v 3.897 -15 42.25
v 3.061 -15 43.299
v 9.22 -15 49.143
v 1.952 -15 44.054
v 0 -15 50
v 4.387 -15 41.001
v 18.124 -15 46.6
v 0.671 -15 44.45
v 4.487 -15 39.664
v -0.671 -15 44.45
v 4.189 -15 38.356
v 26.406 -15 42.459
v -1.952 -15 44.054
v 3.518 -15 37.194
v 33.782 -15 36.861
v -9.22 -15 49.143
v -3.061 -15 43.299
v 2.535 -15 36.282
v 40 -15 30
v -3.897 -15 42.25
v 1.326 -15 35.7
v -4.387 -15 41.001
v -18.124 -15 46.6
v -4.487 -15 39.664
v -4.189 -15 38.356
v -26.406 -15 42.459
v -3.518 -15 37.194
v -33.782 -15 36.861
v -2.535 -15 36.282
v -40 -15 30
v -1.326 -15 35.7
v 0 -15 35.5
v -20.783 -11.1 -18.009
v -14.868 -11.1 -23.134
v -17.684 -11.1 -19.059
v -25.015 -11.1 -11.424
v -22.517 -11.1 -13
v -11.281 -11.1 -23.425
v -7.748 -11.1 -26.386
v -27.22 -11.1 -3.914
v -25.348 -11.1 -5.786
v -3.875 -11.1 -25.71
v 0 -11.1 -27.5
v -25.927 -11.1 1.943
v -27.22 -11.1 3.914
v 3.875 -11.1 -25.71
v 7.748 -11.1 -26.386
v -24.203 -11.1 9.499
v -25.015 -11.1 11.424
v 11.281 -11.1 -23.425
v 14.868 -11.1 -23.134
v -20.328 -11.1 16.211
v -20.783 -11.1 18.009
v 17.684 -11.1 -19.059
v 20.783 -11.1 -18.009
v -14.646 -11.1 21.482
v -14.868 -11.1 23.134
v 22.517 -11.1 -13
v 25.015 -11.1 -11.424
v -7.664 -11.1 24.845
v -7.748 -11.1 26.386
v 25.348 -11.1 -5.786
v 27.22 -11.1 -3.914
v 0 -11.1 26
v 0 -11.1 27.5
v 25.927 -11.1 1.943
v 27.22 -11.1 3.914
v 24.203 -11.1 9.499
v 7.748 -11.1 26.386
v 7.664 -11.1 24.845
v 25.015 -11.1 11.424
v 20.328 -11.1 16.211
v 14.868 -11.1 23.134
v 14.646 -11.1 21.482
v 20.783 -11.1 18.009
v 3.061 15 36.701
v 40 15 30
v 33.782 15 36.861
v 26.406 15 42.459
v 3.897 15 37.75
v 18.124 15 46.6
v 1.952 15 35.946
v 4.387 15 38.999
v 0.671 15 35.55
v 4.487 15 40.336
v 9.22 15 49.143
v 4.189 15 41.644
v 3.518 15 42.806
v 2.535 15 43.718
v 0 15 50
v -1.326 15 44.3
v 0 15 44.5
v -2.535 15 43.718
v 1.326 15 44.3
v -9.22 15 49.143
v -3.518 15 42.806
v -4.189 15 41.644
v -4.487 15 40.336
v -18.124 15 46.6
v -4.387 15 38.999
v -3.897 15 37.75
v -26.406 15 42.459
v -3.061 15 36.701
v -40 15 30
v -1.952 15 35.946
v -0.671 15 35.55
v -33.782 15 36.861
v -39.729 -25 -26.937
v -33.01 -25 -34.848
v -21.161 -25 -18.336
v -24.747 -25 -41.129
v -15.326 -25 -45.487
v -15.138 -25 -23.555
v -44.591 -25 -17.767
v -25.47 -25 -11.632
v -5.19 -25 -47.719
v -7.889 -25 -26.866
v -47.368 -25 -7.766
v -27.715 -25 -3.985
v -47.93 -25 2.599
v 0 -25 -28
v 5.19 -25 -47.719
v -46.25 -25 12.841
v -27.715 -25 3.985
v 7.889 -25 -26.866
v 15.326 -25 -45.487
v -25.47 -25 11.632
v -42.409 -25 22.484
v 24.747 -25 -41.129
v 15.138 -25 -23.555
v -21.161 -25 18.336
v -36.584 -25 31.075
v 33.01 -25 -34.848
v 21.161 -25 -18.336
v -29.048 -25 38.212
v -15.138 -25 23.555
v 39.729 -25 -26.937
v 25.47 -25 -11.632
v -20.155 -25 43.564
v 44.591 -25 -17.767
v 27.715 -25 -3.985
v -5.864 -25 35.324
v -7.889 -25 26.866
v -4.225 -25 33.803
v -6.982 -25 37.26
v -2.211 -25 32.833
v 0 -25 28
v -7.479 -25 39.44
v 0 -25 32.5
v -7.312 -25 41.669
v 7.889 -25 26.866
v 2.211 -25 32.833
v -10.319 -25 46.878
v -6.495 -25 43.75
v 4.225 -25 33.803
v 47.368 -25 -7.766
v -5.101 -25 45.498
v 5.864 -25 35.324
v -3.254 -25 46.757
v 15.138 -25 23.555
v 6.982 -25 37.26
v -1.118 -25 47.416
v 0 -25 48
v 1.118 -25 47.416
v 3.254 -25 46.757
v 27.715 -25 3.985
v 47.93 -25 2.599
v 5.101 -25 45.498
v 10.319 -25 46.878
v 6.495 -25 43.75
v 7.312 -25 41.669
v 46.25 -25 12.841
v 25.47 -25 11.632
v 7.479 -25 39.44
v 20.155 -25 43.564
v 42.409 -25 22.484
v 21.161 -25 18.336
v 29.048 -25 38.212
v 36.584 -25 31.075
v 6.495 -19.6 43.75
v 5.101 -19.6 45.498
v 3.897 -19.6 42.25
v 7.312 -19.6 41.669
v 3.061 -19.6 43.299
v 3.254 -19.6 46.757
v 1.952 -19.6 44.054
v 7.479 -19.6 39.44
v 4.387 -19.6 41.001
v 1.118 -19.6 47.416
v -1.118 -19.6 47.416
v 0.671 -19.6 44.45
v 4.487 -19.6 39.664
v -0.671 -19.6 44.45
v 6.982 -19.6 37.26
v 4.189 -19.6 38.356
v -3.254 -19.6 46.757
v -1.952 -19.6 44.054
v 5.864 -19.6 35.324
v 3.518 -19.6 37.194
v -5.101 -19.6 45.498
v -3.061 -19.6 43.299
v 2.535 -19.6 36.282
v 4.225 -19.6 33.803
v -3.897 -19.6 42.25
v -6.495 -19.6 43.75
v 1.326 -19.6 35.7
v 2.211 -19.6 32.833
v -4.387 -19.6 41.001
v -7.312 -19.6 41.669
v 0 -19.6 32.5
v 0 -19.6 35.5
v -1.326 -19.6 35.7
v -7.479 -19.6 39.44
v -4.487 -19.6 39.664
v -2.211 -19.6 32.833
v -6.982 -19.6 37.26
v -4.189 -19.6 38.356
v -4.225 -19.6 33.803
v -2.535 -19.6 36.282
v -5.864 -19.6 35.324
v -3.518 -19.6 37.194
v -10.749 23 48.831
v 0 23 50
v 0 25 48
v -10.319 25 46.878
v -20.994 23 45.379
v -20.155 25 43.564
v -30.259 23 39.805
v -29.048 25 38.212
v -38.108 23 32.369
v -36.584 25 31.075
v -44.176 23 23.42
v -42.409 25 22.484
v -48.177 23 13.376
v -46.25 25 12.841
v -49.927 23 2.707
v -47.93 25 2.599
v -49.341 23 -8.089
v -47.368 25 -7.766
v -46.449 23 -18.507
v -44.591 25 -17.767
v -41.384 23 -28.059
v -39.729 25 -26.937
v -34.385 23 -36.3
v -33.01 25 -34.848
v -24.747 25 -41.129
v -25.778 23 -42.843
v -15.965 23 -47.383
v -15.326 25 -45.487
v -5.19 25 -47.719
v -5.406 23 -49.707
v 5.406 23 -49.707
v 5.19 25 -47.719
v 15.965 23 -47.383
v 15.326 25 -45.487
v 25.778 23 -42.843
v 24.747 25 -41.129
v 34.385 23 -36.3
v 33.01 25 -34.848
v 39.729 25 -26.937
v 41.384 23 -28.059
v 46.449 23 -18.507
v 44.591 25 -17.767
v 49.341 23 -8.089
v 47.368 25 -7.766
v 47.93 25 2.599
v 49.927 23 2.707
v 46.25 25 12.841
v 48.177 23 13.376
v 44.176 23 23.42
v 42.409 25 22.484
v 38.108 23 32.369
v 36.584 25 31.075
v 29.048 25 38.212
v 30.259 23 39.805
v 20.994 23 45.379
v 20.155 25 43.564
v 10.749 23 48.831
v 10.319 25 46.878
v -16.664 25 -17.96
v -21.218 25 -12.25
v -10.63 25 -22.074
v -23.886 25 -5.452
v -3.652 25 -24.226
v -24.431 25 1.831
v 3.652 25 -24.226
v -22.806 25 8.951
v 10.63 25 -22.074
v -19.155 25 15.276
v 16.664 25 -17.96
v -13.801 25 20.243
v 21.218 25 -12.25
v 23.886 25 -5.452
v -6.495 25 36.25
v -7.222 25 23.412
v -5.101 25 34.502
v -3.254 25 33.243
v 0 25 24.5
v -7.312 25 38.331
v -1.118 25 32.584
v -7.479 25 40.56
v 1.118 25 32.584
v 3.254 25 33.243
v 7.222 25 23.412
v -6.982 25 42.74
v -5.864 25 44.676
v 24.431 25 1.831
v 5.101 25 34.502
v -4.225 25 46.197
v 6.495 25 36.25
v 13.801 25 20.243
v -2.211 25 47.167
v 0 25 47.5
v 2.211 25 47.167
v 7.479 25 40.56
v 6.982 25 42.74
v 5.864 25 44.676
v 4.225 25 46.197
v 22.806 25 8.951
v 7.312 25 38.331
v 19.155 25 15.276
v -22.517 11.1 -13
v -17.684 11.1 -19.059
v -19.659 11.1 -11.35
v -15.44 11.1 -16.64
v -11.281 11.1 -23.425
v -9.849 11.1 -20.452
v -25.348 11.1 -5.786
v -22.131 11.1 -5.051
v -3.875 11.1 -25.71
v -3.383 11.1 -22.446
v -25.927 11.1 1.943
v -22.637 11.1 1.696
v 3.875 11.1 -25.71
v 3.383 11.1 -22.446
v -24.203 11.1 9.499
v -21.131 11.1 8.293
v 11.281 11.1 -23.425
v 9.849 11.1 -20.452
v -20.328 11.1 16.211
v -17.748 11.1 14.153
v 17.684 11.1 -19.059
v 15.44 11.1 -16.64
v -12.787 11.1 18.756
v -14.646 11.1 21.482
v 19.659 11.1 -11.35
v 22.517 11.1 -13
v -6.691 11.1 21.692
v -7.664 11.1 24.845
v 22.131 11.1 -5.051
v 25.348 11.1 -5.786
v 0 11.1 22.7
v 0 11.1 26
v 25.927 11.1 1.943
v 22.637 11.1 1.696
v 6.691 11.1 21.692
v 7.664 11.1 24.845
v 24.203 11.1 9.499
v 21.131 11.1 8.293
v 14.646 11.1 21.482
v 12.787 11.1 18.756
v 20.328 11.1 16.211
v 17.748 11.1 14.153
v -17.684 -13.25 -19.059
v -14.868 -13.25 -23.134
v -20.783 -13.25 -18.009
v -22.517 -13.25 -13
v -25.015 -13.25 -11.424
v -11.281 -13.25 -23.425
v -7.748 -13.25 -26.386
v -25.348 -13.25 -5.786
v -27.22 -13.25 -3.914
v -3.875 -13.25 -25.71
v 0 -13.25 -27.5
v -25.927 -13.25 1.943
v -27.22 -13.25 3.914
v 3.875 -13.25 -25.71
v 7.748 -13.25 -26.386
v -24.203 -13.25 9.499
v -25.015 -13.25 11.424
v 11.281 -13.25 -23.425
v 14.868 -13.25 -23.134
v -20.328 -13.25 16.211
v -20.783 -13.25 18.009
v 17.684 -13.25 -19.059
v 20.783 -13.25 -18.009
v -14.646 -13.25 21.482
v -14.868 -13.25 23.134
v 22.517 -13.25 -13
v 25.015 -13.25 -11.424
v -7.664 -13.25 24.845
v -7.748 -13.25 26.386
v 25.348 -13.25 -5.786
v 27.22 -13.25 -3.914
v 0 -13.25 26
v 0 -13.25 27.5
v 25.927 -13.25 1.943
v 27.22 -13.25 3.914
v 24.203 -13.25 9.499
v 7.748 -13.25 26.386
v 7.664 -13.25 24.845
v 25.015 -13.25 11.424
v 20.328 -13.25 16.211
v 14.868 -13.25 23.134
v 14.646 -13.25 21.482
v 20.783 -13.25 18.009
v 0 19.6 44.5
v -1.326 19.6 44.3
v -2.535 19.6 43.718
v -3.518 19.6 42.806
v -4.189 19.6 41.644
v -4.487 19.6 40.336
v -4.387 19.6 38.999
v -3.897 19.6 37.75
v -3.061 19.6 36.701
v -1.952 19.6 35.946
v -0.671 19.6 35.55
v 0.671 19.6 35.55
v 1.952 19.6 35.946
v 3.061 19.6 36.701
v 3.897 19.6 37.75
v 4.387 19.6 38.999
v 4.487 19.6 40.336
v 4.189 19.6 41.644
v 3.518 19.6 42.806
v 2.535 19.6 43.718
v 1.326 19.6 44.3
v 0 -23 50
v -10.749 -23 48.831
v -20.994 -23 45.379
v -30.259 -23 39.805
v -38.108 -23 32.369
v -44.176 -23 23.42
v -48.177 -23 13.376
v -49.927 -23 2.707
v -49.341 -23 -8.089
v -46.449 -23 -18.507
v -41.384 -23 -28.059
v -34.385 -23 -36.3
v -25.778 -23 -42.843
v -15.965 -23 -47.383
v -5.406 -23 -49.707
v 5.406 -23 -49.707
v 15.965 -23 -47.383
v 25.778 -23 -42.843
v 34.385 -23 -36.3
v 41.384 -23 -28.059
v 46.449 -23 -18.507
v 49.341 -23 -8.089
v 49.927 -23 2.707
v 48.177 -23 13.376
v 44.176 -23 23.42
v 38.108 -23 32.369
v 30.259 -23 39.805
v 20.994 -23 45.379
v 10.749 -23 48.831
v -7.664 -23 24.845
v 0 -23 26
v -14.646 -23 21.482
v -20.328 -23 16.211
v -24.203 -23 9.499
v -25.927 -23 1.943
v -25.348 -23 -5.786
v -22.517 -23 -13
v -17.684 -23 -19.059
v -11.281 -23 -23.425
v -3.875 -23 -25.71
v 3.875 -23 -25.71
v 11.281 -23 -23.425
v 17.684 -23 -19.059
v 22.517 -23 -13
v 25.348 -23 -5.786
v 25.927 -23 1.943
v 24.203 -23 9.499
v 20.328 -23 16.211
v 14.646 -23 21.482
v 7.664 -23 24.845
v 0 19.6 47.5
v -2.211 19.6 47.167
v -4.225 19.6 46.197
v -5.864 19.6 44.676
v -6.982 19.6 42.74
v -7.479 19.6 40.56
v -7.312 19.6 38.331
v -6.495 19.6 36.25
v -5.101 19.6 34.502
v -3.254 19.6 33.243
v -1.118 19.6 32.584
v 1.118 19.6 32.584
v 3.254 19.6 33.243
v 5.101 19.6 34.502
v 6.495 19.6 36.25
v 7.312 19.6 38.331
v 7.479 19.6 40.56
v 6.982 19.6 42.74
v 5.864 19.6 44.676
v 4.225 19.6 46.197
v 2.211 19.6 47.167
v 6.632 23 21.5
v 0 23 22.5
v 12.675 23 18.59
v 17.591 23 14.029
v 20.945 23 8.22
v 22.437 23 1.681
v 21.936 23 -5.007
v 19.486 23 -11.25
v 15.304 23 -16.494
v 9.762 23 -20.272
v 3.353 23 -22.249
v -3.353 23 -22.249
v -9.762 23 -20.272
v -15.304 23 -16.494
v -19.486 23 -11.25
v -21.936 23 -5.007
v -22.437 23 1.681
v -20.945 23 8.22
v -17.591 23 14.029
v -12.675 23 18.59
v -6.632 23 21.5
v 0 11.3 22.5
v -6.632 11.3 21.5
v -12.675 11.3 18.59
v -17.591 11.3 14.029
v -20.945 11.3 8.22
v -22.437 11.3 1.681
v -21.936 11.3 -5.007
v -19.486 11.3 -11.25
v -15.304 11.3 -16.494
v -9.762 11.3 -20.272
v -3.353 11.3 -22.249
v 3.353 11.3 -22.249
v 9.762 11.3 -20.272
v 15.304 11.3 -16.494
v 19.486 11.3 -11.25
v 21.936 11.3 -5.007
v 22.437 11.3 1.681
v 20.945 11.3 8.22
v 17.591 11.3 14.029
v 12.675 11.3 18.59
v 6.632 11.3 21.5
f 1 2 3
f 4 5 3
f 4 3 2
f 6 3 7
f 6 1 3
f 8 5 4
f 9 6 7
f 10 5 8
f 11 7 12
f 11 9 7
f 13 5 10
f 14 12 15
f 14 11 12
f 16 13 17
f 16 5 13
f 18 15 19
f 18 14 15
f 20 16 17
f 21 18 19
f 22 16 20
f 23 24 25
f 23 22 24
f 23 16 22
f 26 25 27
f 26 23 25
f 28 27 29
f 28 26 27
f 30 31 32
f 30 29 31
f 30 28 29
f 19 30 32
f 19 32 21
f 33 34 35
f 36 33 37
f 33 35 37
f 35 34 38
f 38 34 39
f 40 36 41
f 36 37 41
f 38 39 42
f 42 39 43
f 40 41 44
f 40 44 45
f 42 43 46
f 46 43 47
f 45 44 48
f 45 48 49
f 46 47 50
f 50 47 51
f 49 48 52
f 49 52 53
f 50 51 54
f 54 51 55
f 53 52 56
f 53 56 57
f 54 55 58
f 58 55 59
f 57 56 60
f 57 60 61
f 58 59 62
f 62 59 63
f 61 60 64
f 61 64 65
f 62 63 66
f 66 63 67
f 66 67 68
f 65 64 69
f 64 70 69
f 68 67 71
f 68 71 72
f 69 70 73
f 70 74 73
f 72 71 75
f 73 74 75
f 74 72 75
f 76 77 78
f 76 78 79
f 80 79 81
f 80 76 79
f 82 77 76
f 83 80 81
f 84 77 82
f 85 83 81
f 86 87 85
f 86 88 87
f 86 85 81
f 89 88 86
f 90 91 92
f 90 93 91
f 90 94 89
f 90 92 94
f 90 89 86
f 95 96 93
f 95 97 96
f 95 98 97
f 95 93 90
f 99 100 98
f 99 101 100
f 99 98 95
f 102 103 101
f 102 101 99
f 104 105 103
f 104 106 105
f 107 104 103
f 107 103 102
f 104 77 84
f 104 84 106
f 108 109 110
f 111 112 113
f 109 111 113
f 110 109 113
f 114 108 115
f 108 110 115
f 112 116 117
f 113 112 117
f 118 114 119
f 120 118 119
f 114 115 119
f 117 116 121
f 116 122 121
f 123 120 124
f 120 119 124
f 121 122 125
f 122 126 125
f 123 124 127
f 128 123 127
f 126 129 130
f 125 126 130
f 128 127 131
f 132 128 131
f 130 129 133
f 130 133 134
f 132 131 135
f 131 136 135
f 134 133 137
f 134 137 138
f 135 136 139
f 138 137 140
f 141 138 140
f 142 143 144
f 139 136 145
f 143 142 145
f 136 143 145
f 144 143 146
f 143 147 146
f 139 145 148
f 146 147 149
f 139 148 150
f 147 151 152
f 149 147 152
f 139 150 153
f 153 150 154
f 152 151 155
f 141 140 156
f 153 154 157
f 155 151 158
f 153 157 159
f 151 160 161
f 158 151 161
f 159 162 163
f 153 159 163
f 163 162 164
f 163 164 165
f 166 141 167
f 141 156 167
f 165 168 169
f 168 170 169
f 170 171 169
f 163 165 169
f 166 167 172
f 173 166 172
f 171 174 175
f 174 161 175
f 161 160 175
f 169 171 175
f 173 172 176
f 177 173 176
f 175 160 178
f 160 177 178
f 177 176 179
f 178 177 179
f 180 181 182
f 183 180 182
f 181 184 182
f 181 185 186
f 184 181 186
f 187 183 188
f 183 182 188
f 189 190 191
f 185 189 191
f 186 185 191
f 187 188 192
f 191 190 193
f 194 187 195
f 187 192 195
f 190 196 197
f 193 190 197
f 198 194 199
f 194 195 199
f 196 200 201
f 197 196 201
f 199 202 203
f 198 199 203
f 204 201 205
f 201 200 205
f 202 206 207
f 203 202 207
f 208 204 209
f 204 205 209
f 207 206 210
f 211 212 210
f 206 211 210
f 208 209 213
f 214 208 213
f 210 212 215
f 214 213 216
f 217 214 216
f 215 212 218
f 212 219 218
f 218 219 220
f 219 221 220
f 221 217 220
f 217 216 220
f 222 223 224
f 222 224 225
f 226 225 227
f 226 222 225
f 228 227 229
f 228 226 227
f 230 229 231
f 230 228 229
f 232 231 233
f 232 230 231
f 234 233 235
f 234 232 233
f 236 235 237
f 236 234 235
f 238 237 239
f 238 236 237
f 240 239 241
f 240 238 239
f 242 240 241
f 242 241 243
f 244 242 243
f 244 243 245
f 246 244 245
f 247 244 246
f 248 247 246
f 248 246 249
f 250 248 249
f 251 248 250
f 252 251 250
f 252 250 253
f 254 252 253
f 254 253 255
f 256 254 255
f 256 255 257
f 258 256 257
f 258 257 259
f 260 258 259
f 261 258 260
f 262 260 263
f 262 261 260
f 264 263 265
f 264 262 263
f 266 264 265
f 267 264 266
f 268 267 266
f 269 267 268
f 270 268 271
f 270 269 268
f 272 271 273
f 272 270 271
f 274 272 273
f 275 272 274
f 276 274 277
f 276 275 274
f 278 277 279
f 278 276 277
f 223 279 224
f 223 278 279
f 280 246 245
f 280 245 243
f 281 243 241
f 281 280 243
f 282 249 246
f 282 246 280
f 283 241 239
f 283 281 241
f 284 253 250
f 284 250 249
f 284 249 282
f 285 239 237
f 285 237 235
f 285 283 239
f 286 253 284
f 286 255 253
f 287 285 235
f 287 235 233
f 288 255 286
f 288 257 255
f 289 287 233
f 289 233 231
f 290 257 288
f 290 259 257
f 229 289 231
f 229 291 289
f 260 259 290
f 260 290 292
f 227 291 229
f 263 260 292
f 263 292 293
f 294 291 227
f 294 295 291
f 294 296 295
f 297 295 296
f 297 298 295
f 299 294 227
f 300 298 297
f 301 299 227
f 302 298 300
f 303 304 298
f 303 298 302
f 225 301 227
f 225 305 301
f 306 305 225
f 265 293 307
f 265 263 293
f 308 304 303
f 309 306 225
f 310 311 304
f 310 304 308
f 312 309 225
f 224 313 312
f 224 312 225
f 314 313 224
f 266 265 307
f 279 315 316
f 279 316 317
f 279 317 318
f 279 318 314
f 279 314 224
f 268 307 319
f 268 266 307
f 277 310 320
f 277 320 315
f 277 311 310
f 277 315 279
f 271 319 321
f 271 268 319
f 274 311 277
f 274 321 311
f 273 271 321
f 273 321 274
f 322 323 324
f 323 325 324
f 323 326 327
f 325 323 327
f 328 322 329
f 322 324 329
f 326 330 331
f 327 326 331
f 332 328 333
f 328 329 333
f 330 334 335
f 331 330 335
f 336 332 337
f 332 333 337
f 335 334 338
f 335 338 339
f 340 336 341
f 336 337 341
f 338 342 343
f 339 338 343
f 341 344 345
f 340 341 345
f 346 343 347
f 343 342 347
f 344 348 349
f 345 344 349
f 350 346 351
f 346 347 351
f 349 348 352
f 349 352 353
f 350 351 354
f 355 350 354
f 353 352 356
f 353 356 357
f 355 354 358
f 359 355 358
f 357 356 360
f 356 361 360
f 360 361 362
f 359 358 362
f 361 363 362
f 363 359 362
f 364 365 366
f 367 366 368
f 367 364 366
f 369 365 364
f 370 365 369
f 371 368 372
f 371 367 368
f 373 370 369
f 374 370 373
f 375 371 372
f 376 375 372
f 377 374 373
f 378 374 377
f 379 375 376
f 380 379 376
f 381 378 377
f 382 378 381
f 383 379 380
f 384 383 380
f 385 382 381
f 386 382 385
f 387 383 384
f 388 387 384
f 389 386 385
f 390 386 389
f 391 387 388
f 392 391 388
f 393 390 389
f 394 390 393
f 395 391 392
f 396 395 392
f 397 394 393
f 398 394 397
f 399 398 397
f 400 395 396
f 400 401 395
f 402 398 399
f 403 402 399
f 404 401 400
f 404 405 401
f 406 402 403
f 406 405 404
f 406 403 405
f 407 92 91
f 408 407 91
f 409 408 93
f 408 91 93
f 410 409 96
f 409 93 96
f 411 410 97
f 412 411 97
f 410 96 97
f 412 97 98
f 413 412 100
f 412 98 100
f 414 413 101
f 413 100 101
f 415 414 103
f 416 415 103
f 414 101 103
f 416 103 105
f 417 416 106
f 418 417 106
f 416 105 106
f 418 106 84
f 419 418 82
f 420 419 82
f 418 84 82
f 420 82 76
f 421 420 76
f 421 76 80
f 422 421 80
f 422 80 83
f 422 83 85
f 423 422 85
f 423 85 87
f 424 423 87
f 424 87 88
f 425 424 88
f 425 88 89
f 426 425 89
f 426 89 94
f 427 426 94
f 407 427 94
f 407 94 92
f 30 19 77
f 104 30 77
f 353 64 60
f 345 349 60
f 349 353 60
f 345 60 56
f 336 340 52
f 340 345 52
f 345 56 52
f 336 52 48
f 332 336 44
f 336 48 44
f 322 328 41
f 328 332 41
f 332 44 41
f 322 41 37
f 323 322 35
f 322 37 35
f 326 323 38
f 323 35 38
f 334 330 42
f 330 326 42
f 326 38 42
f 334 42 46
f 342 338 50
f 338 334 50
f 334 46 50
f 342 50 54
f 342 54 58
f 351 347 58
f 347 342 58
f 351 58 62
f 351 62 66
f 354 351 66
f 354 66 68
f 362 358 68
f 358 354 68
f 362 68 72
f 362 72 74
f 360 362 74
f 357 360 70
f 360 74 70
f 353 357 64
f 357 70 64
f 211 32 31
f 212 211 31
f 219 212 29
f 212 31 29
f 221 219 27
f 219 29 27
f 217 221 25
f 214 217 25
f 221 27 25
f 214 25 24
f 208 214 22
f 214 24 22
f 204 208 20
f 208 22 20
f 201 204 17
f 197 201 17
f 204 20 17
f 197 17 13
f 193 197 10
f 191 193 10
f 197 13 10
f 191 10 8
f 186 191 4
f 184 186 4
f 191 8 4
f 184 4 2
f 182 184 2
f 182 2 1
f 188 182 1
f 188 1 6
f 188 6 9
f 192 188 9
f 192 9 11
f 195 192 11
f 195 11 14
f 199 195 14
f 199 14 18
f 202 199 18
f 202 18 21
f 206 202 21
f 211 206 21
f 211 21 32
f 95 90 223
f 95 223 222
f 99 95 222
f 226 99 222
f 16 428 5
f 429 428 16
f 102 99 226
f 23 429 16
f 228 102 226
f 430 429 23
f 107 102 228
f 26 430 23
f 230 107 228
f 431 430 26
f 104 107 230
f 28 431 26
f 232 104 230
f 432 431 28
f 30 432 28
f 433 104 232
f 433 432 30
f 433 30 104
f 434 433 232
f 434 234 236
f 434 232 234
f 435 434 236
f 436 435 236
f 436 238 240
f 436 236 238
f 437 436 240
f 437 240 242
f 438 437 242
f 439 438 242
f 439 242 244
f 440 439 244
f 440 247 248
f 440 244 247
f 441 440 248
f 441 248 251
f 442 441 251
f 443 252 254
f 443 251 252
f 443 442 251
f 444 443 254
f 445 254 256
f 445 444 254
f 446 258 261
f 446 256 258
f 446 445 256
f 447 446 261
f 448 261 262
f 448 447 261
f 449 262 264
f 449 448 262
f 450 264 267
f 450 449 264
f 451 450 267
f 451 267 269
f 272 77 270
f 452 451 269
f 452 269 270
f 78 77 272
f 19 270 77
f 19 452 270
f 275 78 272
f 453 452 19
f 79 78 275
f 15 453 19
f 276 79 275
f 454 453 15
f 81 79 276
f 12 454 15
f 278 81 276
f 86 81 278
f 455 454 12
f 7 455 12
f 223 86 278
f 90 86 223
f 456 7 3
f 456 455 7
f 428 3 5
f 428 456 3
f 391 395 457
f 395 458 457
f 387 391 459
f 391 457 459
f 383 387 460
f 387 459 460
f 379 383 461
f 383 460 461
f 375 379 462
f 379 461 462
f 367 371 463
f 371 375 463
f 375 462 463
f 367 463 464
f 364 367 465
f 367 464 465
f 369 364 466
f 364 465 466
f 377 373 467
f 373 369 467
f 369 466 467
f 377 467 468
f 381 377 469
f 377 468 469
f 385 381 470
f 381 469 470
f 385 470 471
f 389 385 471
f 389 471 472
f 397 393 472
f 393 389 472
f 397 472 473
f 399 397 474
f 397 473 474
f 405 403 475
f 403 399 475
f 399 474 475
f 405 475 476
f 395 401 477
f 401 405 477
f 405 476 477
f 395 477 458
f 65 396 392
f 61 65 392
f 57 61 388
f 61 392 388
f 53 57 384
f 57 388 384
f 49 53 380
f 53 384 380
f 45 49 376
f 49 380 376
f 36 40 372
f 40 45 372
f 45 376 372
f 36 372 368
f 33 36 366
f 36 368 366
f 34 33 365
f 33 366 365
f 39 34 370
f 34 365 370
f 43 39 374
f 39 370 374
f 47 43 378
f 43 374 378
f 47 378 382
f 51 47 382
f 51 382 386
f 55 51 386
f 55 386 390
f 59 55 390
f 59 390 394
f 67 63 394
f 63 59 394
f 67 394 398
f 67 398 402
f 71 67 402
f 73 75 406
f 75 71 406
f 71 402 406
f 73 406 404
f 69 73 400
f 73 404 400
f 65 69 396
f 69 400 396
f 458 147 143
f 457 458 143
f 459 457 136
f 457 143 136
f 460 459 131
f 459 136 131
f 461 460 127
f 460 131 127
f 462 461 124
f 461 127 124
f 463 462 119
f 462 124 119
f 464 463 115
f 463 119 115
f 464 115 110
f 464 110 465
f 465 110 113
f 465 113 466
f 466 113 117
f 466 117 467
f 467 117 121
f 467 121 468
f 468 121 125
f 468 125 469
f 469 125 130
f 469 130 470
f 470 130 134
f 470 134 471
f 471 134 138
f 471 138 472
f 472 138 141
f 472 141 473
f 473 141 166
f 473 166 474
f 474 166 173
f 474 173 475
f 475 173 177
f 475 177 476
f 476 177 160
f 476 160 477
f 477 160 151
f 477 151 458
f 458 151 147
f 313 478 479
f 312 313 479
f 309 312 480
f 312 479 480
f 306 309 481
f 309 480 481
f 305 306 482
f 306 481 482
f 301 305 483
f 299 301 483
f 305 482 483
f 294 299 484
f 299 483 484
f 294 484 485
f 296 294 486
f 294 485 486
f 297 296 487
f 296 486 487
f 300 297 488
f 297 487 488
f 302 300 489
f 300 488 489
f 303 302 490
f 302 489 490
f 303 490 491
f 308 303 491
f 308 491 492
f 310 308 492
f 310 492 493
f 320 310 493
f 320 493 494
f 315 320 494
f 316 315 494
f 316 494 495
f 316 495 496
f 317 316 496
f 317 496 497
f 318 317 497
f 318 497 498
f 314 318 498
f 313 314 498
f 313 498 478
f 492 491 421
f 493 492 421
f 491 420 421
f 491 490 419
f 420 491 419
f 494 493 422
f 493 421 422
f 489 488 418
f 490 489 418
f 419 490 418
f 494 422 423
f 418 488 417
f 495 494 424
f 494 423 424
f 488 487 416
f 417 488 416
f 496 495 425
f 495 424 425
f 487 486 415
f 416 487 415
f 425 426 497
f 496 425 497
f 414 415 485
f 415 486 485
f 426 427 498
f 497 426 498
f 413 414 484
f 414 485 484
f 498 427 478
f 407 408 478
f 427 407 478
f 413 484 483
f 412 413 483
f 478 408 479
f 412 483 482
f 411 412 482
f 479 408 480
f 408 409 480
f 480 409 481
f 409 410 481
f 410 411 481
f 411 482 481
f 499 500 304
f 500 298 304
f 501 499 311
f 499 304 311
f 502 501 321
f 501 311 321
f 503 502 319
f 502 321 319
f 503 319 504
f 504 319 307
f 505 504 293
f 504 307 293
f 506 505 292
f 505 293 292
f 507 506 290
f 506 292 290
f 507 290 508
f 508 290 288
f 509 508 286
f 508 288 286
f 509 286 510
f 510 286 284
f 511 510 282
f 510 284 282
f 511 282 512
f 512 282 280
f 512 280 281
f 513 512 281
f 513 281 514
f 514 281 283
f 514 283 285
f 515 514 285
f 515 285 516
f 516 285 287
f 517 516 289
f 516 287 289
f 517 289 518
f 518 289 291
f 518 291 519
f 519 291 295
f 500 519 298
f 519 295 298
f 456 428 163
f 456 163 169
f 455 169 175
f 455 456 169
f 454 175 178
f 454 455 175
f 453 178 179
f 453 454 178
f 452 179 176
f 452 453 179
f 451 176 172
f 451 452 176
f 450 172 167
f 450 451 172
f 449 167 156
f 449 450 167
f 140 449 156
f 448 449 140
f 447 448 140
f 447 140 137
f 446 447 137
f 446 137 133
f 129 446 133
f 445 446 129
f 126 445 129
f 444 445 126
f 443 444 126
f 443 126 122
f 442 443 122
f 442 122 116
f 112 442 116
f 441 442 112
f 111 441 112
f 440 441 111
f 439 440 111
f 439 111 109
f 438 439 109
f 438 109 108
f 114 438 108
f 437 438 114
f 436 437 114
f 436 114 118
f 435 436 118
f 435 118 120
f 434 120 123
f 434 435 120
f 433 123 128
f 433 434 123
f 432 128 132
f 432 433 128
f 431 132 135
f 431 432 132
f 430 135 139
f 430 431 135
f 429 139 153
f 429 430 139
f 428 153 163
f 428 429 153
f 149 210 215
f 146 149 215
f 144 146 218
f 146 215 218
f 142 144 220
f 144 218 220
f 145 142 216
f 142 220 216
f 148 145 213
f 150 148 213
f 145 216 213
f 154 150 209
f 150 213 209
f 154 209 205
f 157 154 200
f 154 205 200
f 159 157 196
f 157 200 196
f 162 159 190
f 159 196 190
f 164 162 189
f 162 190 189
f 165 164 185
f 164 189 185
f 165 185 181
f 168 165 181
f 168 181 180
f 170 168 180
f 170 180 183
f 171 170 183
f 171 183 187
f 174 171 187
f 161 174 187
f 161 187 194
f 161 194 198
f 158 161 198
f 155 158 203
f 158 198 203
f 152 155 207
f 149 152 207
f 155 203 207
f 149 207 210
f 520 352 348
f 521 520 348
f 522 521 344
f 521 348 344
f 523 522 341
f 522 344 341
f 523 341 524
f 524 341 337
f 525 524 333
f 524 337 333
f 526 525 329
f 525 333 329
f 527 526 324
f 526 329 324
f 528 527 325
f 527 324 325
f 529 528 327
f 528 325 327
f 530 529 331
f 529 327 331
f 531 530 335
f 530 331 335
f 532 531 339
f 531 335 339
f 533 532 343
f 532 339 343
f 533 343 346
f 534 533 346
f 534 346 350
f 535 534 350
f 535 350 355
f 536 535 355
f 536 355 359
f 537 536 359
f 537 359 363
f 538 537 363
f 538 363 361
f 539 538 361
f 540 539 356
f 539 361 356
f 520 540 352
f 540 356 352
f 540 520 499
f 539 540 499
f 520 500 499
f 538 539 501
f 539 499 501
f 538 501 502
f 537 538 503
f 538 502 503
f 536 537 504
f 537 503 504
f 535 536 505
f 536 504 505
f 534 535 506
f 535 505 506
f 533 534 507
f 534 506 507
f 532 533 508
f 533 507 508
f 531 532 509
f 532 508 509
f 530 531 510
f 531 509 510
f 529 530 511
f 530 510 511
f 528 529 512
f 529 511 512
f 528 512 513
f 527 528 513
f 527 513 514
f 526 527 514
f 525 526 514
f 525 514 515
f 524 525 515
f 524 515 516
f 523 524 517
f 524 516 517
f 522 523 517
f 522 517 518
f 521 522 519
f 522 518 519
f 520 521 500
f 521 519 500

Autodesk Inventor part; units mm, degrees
ref_plane "YZ Plane" through (0, 0, 0) normal (1, 0, 0) x (0, 1, 0)
ref_plane "XZ Plane" through (0, 0, 0) normal (0, 1, 0) x (-1, 0, 0)
ref_plane "XY Plane" through (0, 0, 0) normal (0, 0, 1) x (1, 0, 0)
sketch "Skizze3" plane through (0, 0, 0) normal (1, 0, 0) x (0, 1, 0)
  line L0 (0, 60) -> (0, -10) construction
  line L1 (-35, 0) -> (35, 0) construction
  line L2 (25, 0) -> (25, 22.5) construction
  line L3 (25, 50) -> (-25, 50)
  line L4 (-25, 50) -> (-25, 26)
  line L5 (11.1, 0) -> (11.1, 26) construction
  line L6 (11.1, 26) -> (-11.1, 26) construction
  line L7 (-11.1, 26) -> (-11.1, 0) construction
  line L8 (11.1, 22.5) -> (25, 22.5)
  line L9 (11.1, 22.5) -> (11.1, 26)
  line L10 (11.1, 26) -> (-25, 26)
  line L11 (-25, 26) -> (-25, 0) construction
  line L12 (25, 22.5) -> (25, 50)
  point P0 (0, 0)
  dimension "d8" = 100
  dimension "d9" = 50
  dimension "d10" = 52
  dimension "d11" = 22.2
  dimension "d13" = 45
revolve "Grundkörper" add sketch "Skizze3" angle 360 about axis through (0, 0, 0) along (0, 1, 0)
sketch "Skizze4" plane through (0, 0, 0) normal (1, 0, 0) x (0, 1, 0)
  line L0 (-25, 50) -> (25, 50) construction
  line L1 (0, 48) -> (0, -8) construction
  line L2 (-15, 50) -> (-15, 30)
  line L3 (-15, 30) -> (15, 30)
  line L4 (15, 30) -> (15, 50)
  line L5 (-15, 50) -> (15, 50)
  point P0 (0, 0)
  dimension "d17" = 30
  dimension "d18" = 20
extrude "Profil_Ausschnitt" cut sketch "Skizze4" along normal through all both and the other way through all
sketch "Skizze5" plane through (0, -25, 0) normal (0, -1, 0) x (1, 0, 0)
  circle A0 centre (0, 0) radius 50 construction
  line L0 (0, 70) -> (0, -70) construction
  line L1 (-40, 30) -> (40, 30) construction
  line L2 (0, 30) -> (0, 50) construction
  point P0 (0, 40)
hole "DIN7984_M8_Boh" at (0, -25, 40) direction (0, 1, 0) diameter 9 end up to surface counterbore diameter 15 counterbore depth 5.4
mirror "Spiegelung_DIN7984_M8_Boh" about plane through (0, 0, 0) normal (0, 1, 0) of "DIN7984_M8_Boh"
sketch "Skizze7" plane through (0, 0, 0) normal (1, 0, 0) x (0, 1, 0)
  line L0 (-35, 0) -> (35, 0) construction
  line L1 (11.1, -26) -> (11.1, 26) construction
  line L2 (11.1, 26) -> (-25, 26) construction
  line L3 (-11.1, 26) -> (-11.1, 27.5)
  line L4 (-11.1, 27.5) -> (-13.25, 27.5)
  line L5 (-13.25, 27.5) -> (-13.25, 26)
  line L6 (-11.1, 26) -> (-13.25, 26)
  point P0 (0, 0)
  dimension "d34" = 55
  dimension "d35" = 2.15
  dimension "d36" = 22.2
revolve "DIN472-52x2-Nut" cut sketch "Skizze7" angle 360 about axis through (0, 0, 0) along (0, 1, 0)
chamfer "Fase_Allgemein" distance 2 angle 45 4 edges at (0, -25, -50) (0, 25, -50) (0, -25, -26) (0, 25, -22.5)
chamfer "Fase2" distance 0.2 angle 45 1 edges at (0, 11.1, -22.5)
properties part number "200-30-ROCKER-BOGIE-BEARING-01" material "Aluminium 6061"
